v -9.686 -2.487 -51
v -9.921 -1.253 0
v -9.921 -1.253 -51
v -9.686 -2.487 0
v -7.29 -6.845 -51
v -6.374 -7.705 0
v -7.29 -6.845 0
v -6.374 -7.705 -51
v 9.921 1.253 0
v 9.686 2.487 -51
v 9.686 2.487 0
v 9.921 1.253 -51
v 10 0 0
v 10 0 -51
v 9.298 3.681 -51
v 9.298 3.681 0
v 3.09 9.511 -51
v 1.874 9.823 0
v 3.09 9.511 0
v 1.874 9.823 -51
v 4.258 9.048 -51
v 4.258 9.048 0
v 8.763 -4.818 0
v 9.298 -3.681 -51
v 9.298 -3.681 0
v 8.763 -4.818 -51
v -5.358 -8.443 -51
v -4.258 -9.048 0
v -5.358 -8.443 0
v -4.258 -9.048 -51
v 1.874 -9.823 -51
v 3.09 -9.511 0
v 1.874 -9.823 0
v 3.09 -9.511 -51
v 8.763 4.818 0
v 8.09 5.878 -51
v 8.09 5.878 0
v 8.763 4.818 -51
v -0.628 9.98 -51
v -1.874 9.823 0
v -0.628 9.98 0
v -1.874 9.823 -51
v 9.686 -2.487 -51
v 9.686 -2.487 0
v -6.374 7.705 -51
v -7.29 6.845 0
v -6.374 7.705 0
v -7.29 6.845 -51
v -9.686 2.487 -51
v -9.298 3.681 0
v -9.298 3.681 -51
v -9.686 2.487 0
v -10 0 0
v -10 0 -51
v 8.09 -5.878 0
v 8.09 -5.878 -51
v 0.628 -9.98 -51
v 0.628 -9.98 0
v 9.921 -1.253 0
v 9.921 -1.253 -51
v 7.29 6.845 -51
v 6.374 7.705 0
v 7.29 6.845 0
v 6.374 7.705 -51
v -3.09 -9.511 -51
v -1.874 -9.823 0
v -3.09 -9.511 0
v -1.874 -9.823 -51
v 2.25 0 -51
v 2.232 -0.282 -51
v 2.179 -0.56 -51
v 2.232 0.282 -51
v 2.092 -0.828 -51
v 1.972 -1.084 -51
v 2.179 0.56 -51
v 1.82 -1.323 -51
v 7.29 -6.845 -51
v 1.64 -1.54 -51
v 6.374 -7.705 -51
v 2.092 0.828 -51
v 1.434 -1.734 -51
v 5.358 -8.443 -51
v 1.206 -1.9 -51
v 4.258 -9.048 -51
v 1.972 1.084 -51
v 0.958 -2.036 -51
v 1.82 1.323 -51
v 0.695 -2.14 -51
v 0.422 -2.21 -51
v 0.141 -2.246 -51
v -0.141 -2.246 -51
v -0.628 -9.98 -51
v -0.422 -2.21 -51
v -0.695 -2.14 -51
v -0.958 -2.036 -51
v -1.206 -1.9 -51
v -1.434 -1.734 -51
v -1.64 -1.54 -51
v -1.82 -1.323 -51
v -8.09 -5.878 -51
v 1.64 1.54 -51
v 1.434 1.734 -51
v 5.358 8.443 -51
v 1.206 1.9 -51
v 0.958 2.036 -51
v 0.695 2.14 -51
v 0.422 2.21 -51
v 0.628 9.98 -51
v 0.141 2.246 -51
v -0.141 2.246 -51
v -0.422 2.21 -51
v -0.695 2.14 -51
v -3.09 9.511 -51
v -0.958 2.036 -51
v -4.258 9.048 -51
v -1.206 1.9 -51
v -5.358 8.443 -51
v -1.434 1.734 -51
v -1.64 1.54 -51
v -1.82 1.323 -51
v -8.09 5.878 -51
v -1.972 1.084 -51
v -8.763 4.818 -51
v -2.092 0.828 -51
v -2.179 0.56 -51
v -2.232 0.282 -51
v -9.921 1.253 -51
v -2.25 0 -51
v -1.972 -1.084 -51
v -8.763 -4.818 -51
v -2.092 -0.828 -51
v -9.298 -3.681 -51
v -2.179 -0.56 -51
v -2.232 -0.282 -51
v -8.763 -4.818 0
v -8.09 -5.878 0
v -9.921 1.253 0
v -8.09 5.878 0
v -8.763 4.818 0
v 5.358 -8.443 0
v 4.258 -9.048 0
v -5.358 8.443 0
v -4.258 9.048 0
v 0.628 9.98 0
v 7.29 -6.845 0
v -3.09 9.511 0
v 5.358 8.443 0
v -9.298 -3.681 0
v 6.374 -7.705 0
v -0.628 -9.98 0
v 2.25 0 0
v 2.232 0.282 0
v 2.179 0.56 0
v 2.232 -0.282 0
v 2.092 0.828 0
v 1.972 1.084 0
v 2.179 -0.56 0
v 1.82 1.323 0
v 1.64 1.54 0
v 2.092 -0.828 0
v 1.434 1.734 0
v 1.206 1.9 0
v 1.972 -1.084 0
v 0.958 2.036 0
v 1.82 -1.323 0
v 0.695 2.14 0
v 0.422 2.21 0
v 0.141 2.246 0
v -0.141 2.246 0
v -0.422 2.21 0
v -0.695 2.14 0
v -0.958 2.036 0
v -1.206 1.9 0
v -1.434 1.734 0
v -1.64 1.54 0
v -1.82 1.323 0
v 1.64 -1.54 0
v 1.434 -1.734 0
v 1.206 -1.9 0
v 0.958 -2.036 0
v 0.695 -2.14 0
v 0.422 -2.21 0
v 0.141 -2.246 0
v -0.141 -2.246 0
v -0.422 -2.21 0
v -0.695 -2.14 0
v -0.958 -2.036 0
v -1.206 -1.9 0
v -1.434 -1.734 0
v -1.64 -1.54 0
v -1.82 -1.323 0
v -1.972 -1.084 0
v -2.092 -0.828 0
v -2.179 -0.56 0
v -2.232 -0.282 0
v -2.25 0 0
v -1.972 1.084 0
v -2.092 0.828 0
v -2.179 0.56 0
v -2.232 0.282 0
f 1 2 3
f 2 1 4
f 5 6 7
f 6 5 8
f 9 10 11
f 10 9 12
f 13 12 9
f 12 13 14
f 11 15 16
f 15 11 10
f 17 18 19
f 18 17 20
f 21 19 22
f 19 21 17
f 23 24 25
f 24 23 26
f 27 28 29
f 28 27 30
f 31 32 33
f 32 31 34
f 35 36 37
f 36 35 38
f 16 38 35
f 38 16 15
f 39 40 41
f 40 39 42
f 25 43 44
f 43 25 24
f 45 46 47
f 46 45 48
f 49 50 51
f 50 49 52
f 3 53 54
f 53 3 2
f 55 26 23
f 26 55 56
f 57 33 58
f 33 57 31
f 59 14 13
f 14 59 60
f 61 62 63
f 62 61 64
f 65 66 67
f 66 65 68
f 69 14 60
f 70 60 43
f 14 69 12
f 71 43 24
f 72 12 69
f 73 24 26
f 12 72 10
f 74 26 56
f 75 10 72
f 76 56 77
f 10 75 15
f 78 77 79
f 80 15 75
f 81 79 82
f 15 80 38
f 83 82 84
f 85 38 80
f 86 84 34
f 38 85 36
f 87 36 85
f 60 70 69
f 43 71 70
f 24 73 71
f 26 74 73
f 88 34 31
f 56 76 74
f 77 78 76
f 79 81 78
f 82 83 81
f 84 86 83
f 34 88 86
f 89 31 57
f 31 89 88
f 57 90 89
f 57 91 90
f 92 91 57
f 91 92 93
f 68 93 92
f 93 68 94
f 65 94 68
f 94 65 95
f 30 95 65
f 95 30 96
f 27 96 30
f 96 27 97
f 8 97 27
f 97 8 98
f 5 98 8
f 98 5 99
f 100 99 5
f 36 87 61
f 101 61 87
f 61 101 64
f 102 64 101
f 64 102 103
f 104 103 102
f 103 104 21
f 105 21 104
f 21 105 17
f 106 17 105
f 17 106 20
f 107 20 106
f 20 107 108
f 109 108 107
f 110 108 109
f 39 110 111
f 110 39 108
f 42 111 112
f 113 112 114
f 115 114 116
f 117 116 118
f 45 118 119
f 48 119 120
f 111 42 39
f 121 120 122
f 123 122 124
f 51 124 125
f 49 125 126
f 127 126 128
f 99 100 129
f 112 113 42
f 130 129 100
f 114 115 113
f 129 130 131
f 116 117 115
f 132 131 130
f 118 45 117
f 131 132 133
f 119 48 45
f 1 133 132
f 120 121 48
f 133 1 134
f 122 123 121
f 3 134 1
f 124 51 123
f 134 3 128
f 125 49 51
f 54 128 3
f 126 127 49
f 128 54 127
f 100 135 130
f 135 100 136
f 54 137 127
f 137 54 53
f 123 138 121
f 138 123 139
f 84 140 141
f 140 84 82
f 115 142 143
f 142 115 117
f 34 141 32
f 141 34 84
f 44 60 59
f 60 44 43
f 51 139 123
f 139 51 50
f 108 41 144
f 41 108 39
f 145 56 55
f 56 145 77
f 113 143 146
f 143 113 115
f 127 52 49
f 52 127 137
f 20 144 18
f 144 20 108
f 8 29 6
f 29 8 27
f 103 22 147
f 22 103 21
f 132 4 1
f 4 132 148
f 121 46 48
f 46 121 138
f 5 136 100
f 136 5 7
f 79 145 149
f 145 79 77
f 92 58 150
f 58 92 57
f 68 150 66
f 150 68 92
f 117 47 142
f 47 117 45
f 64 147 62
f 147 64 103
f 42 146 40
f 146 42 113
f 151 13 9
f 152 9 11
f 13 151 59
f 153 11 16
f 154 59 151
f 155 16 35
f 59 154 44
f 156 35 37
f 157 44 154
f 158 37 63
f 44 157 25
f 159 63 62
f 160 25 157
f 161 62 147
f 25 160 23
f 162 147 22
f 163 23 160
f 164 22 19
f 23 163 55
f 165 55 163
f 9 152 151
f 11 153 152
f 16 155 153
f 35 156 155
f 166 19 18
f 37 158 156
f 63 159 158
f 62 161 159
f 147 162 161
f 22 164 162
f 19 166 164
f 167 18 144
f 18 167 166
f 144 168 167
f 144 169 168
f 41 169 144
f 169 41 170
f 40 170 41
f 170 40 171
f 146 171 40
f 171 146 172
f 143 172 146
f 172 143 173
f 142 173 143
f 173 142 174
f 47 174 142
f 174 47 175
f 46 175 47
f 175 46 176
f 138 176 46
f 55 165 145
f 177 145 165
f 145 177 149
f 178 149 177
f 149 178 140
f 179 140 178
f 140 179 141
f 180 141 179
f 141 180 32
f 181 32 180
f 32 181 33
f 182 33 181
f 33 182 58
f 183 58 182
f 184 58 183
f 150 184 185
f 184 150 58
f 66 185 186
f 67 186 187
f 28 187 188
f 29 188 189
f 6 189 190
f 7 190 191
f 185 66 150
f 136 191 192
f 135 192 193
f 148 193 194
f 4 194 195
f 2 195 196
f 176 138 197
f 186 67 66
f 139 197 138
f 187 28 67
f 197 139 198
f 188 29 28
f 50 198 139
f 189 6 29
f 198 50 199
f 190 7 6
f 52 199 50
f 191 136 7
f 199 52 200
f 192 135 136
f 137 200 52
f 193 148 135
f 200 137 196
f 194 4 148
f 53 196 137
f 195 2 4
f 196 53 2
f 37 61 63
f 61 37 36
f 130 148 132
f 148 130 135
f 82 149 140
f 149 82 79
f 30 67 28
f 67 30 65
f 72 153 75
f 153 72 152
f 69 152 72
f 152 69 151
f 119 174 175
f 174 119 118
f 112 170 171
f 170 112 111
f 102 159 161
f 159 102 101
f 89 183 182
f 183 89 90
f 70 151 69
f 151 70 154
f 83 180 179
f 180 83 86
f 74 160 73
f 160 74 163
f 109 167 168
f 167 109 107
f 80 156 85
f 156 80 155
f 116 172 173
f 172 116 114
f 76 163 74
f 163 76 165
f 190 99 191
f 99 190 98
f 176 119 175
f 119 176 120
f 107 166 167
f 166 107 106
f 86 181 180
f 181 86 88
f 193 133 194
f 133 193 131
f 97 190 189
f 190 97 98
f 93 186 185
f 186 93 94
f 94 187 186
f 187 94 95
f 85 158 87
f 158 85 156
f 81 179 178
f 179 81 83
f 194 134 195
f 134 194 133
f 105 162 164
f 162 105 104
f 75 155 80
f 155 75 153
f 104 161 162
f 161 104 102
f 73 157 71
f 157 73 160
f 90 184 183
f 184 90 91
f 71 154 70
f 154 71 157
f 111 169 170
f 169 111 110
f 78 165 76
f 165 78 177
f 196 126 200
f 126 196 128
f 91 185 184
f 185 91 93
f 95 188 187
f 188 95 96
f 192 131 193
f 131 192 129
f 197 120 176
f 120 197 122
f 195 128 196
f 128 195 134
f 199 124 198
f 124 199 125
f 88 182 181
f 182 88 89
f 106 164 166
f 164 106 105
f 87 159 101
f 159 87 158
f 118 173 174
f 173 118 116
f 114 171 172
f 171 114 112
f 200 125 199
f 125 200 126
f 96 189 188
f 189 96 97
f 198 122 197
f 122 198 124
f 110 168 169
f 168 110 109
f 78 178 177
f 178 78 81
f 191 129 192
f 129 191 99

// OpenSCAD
$fn = 50;


difference() {
	union() {
		translate(v = [0, 0, -51.0000000000]) {
			cylinder(h = 51, r = 10.0000000000);
		}
		cylinder(h = 0, r = 13.0000000000);
	}
	union() {
		#translate(v = [0, 0, -51]) {
			cylinder(h = 51, r = 2.2500000000);
		}
	}
}
